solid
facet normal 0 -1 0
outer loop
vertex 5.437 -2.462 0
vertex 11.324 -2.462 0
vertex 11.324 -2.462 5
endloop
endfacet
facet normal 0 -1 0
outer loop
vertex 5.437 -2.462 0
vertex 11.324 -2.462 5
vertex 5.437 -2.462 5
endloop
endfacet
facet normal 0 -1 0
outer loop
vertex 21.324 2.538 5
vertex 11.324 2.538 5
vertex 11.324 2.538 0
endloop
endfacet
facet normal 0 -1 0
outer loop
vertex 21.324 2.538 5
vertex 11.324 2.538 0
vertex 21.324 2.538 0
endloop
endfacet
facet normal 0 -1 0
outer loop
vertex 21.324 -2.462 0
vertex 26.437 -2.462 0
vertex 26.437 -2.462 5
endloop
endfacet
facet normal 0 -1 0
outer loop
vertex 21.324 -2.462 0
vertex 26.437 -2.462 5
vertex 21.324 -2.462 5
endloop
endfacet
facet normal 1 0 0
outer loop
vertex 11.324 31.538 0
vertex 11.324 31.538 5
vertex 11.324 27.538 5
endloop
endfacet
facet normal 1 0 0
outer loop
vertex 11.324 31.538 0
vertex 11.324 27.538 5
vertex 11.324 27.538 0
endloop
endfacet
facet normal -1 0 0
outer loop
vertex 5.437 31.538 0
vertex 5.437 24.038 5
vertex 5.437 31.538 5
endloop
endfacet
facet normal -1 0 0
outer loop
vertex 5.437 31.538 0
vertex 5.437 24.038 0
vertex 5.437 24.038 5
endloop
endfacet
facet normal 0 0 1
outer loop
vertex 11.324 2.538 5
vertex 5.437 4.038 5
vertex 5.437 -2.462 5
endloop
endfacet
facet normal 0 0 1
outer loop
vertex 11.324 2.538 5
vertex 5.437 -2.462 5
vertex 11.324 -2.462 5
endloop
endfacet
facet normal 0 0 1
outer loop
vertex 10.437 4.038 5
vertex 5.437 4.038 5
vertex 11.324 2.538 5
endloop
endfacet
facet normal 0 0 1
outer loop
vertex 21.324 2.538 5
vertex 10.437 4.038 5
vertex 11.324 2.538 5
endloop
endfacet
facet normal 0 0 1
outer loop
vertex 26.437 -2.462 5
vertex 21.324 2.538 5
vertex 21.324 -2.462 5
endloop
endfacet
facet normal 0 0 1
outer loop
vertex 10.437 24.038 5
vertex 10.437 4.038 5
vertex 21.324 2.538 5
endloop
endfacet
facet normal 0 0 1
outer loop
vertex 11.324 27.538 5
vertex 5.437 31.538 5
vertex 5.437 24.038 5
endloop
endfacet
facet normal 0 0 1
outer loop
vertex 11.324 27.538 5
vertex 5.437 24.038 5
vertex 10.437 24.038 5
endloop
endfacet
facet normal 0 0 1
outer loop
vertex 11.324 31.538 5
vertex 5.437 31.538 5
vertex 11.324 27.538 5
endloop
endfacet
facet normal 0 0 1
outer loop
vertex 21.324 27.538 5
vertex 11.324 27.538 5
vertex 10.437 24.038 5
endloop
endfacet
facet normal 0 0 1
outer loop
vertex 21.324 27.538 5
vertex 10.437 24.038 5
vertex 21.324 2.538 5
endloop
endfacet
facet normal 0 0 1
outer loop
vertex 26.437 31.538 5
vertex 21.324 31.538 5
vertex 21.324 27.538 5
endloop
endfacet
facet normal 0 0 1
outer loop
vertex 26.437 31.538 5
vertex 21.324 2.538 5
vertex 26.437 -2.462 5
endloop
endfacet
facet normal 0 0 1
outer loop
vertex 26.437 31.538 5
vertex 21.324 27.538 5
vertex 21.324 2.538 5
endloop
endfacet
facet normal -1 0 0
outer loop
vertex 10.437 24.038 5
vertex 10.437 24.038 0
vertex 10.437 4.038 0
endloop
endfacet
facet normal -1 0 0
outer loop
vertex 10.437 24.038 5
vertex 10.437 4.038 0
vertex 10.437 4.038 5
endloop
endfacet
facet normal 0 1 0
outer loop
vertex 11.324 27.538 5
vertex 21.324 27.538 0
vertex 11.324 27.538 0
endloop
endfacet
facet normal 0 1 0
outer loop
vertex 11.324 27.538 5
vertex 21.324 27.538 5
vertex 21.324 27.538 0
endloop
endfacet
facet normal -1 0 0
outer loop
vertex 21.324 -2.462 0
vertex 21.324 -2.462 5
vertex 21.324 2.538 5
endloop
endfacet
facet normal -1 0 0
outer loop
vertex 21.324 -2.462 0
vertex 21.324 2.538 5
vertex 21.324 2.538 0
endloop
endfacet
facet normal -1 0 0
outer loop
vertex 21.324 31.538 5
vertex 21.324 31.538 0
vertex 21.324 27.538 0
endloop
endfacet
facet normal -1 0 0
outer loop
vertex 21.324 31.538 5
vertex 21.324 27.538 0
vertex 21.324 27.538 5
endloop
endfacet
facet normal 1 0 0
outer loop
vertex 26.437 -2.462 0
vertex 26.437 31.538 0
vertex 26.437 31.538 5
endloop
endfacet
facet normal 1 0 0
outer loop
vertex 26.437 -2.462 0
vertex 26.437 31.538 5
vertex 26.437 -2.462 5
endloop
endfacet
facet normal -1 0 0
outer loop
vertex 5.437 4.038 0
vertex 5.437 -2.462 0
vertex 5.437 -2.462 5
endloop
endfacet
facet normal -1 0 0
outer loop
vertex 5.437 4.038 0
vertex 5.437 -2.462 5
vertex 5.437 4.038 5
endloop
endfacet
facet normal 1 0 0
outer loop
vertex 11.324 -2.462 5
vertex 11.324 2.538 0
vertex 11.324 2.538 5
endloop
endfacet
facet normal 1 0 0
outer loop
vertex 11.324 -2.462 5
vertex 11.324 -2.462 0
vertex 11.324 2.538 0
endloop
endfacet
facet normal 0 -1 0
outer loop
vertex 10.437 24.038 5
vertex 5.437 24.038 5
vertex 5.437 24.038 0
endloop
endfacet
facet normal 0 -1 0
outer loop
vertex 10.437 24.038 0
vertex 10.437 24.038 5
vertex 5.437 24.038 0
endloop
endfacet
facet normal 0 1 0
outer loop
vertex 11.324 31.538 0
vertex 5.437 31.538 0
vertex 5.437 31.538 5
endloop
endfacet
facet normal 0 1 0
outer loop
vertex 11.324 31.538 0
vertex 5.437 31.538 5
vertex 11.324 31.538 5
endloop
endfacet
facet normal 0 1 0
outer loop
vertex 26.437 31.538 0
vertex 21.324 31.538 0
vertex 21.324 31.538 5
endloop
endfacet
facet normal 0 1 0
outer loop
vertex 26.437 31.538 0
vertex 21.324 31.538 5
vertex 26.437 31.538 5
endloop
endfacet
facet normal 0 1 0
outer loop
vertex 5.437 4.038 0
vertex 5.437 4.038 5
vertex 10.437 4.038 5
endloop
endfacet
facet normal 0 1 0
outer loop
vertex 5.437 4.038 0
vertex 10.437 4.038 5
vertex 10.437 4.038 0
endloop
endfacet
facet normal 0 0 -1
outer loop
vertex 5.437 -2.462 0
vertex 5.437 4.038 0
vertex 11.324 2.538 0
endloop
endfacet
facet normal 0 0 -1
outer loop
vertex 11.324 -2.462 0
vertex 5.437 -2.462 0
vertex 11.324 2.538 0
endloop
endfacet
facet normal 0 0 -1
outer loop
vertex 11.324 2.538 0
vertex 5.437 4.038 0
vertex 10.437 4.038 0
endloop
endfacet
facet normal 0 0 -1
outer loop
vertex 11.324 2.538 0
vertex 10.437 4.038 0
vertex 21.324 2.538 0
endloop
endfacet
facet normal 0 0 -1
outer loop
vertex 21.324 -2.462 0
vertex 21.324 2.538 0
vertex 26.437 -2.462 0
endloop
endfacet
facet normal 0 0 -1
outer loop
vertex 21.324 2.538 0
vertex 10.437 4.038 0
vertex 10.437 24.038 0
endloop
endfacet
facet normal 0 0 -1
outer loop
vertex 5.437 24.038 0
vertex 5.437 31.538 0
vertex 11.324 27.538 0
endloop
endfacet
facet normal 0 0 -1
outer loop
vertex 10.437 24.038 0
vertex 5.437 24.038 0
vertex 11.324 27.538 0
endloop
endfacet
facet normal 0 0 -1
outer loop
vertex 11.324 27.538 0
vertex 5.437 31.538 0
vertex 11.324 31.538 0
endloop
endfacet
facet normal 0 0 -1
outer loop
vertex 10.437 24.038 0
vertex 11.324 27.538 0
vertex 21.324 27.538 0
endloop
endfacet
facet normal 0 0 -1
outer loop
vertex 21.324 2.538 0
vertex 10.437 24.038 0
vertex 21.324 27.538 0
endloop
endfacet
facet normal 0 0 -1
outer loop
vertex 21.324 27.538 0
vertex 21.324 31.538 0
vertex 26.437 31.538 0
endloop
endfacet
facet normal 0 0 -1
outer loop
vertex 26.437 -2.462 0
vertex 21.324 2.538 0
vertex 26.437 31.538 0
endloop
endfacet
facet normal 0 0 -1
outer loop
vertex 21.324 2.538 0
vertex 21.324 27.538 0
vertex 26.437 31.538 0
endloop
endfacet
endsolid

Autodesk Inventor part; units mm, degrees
ref_plane "YZ Plane" through (0, 0, 0) normal (1, 0, 0) x (0, 1, 0)
ref_plane "XZ Plane" through (0, 0, 0) normal (0, 1, 0) x (-1, 0, 0)
ref_plane "XY Plane" through (0, 0, 0) normal (0, 0, 1) x (1, 0, 0)
sketch "Sketch1" plane through (0, 0, 0) normal (0, 0, 1) x (1, 0, 0)
  line L0 (5.4369, 31.5378) -> (26.4369, 31.5378)
  line L1 (26.4369, 31.5378) -> (26.4369, -2.4622)
  line L2 (26.4369, -2.4622) -> (5.4369, -2.4622)
  line L3 (5.4369, -2.4622) -> (5.4369, 31.5378)
  dimension "d3" = 21
  dimension "d4" = 34
extrude "Extrusion1" add sketch "Sketch1" along normal blind 5
sketch "Sketch2" plane through (5.4369, -2.4622, 0) normal (0, -1, 0) x (1, 0, 0)
  line L0 (0, 5) -> (21, 5) projected
  line L1 (3, 5) -> (18.7735, 5)
  line L2 (3, 5) -> (5.8868, 0)
  line L3 (0, 0) -> (21, 0) projected
  line L4 (3, 5) -> (8.7735, 5) construction
  line L5 (18.7735, 5) -> (15.8868, 0)
  line L6 (18.7735, 5) -> (24.547, 5) construction
  line L7 (15.8868, 0) -> (5.8868, 0)
  line L8 (5.8868, 0) -> (5.8868, 5)
  line L9 (15.8868, 5) -> (15.8868, 0)
  point P0 (-5.4369, 0)
  dimension "d8" = 3
  dimension "d9" = 60
  dimension "d10" = 120
  dimension "d32" = 10
extrude "Extrusion2" cut sketch "Sketch2" against normal blind 5 contours L0 L9 L3 L8
ref_plane "Work Plane1" through (5.4369, 15.0378, 0) normal (0, 1, 0) x (1, 0, 0)
mirror "Mirror1" about plane through (5.4369, 15.0378, 0) normal (0, 1, 0) of "Extrusion2"
sketch "Sketch3" plane through (5.4369, -2.4622, 0) normal (-1, 0, 0) x (0, 0, 1)
  line L0 (0, 34) -> (5, 34) projected
  line L1 (0, 1) -> (0, 34)
  line L2 (0, 34) -> (5, 34)
  line L3 (5, 34) -> (5, 0)
  line L4 (5, 6.5) -> (5, 26.5)
  line L5 (5, 6.5) -> (0, 6.5)
  line L6 (5, 6.5) -> (10, 6.5) construction
  line L7 (5, 26.5) -> (0, 26.5)
  line L8 (5, 26.5) -> (10, 26.5) construction
  line L9 (0, 26.5) -> (0, 6.5)
  dimension "d24" = 20
  dimension "d25" = 6.5
  dimension "d28" = 180
  dimension "d31" = 90
extrude "Extrusion3" cut sketch "Sketch3" against normal blind 5 contours L7 L3 L5 L1
sketch "Sketch4" plane through (0, 0, 5) normal (0, 0, 1) x (1, 0, 0)
  point P0 (0, 0)
